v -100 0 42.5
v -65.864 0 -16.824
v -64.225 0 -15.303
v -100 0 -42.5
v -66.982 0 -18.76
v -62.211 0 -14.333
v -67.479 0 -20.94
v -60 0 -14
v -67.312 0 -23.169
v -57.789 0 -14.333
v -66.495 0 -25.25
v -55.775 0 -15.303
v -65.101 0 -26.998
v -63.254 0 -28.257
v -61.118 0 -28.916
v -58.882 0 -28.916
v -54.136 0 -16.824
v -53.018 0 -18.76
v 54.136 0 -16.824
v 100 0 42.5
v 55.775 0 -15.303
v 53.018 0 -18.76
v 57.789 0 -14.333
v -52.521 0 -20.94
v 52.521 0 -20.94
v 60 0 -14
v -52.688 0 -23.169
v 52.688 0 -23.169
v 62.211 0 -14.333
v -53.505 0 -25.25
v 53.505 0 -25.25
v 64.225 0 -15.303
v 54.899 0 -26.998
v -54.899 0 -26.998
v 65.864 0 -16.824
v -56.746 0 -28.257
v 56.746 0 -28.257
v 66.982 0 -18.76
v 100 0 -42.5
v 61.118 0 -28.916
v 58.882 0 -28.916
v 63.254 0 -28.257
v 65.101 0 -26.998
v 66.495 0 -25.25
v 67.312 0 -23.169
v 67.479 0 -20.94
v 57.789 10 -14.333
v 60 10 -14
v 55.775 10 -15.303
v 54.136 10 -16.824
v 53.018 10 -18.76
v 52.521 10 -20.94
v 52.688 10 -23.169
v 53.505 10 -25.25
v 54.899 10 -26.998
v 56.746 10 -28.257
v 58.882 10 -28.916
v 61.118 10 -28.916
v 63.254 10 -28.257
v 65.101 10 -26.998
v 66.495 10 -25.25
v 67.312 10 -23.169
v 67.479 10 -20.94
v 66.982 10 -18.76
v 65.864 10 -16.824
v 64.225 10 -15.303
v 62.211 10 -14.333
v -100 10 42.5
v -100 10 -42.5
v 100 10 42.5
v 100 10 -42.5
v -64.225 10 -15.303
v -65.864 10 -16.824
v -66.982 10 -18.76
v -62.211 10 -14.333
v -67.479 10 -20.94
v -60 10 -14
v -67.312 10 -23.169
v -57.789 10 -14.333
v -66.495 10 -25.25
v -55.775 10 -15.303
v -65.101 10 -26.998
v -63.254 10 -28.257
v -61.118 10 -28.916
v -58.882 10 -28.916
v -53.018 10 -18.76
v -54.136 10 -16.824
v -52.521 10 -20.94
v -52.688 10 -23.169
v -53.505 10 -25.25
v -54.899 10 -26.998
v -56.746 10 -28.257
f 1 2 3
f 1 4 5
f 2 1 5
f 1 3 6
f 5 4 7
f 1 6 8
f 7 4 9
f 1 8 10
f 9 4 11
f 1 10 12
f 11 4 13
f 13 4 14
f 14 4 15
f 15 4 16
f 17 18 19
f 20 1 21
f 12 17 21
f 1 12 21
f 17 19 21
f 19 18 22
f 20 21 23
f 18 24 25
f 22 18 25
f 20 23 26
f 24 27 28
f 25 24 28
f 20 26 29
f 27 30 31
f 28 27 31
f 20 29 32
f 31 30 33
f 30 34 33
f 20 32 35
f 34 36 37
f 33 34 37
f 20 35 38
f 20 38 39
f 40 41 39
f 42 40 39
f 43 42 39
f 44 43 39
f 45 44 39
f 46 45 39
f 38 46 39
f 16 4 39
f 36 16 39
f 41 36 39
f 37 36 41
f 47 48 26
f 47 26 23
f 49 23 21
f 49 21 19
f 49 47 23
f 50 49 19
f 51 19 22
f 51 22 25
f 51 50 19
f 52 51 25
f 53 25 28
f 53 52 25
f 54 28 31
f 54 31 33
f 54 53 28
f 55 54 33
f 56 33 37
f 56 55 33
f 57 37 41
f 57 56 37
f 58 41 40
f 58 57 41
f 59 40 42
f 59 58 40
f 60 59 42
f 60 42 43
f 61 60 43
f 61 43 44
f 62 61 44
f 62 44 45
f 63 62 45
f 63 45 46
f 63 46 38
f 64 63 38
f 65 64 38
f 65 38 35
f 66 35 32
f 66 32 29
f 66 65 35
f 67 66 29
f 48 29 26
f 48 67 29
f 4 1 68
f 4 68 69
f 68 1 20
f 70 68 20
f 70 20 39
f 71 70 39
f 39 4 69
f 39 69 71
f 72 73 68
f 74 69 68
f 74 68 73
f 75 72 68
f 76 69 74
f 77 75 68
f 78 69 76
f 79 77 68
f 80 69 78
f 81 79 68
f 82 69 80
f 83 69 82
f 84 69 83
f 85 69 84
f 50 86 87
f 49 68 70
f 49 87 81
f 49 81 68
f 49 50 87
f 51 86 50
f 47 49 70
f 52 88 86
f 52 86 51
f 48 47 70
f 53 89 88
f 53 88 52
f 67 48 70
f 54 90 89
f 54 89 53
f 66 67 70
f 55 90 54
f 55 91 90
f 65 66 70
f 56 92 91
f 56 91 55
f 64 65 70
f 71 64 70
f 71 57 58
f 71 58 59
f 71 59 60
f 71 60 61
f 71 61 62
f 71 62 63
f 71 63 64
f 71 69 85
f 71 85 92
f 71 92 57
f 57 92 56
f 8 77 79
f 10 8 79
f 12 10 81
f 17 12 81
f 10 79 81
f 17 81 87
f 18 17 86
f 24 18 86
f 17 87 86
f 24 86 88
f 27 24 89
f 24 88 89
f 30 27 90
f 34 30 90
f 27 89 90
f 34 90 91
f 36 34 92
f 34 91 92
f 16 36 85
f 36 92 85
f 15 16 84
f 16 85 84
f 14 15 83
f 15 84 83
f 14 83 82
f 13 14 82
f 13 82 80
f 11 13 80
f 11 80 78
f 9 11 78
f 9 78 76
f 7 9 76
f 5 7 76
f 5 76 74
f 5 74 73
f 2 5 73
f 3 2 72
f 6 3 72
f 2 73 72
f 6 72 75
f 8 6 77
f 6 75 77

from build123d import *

# Parameters (mm, degrees)
SKETCH1_W           = 200
SKETCH1_H           = 85
BOSS_EXTRUDE1_DEPTH = 10
SKETCH2_R           = 7.5
CUT_EXTRUDE1_DEPTH  = 10


with BuildPart() as part:
    # Sketch1 → Boss-Extrude1 (new body)
    with BuildSketch(Plane(origin=(0, 0, 0), x_dir=(1, 0, 0), z_dir=(0, 1, 0))):
        Rectangle(SKETCH1_W, SKETCH1_H)
    extrude(amount=BOSS_EXTRUDE1_DEPTH)

    # Sketch2 → Cut-Extrude1 (cut)
    with BuildSketch(Plane(origin=(0, 10, 0), x_dir=(1, 0, 0), z_dir=(0, 1, 0))):
        with Locations(Location((-60, 21.5, 0), (0, 0, 270))):
            Circle(SKETCH2_R)
    cut_extrude1 = extrude(amount=-CUT_EXTRUDE1_DEPTH, mode=Mode.SUBTRACT)

    # Mirror1: Cut-Extrude1 across plane
    add(cut_extrude1.mirror(Plane(origin=(0, 0, 0), x_dir=(0, 0, 1), z_dir=(1, 0, 0))), mode=Mode.SUBTRACT)


solid = part.part
